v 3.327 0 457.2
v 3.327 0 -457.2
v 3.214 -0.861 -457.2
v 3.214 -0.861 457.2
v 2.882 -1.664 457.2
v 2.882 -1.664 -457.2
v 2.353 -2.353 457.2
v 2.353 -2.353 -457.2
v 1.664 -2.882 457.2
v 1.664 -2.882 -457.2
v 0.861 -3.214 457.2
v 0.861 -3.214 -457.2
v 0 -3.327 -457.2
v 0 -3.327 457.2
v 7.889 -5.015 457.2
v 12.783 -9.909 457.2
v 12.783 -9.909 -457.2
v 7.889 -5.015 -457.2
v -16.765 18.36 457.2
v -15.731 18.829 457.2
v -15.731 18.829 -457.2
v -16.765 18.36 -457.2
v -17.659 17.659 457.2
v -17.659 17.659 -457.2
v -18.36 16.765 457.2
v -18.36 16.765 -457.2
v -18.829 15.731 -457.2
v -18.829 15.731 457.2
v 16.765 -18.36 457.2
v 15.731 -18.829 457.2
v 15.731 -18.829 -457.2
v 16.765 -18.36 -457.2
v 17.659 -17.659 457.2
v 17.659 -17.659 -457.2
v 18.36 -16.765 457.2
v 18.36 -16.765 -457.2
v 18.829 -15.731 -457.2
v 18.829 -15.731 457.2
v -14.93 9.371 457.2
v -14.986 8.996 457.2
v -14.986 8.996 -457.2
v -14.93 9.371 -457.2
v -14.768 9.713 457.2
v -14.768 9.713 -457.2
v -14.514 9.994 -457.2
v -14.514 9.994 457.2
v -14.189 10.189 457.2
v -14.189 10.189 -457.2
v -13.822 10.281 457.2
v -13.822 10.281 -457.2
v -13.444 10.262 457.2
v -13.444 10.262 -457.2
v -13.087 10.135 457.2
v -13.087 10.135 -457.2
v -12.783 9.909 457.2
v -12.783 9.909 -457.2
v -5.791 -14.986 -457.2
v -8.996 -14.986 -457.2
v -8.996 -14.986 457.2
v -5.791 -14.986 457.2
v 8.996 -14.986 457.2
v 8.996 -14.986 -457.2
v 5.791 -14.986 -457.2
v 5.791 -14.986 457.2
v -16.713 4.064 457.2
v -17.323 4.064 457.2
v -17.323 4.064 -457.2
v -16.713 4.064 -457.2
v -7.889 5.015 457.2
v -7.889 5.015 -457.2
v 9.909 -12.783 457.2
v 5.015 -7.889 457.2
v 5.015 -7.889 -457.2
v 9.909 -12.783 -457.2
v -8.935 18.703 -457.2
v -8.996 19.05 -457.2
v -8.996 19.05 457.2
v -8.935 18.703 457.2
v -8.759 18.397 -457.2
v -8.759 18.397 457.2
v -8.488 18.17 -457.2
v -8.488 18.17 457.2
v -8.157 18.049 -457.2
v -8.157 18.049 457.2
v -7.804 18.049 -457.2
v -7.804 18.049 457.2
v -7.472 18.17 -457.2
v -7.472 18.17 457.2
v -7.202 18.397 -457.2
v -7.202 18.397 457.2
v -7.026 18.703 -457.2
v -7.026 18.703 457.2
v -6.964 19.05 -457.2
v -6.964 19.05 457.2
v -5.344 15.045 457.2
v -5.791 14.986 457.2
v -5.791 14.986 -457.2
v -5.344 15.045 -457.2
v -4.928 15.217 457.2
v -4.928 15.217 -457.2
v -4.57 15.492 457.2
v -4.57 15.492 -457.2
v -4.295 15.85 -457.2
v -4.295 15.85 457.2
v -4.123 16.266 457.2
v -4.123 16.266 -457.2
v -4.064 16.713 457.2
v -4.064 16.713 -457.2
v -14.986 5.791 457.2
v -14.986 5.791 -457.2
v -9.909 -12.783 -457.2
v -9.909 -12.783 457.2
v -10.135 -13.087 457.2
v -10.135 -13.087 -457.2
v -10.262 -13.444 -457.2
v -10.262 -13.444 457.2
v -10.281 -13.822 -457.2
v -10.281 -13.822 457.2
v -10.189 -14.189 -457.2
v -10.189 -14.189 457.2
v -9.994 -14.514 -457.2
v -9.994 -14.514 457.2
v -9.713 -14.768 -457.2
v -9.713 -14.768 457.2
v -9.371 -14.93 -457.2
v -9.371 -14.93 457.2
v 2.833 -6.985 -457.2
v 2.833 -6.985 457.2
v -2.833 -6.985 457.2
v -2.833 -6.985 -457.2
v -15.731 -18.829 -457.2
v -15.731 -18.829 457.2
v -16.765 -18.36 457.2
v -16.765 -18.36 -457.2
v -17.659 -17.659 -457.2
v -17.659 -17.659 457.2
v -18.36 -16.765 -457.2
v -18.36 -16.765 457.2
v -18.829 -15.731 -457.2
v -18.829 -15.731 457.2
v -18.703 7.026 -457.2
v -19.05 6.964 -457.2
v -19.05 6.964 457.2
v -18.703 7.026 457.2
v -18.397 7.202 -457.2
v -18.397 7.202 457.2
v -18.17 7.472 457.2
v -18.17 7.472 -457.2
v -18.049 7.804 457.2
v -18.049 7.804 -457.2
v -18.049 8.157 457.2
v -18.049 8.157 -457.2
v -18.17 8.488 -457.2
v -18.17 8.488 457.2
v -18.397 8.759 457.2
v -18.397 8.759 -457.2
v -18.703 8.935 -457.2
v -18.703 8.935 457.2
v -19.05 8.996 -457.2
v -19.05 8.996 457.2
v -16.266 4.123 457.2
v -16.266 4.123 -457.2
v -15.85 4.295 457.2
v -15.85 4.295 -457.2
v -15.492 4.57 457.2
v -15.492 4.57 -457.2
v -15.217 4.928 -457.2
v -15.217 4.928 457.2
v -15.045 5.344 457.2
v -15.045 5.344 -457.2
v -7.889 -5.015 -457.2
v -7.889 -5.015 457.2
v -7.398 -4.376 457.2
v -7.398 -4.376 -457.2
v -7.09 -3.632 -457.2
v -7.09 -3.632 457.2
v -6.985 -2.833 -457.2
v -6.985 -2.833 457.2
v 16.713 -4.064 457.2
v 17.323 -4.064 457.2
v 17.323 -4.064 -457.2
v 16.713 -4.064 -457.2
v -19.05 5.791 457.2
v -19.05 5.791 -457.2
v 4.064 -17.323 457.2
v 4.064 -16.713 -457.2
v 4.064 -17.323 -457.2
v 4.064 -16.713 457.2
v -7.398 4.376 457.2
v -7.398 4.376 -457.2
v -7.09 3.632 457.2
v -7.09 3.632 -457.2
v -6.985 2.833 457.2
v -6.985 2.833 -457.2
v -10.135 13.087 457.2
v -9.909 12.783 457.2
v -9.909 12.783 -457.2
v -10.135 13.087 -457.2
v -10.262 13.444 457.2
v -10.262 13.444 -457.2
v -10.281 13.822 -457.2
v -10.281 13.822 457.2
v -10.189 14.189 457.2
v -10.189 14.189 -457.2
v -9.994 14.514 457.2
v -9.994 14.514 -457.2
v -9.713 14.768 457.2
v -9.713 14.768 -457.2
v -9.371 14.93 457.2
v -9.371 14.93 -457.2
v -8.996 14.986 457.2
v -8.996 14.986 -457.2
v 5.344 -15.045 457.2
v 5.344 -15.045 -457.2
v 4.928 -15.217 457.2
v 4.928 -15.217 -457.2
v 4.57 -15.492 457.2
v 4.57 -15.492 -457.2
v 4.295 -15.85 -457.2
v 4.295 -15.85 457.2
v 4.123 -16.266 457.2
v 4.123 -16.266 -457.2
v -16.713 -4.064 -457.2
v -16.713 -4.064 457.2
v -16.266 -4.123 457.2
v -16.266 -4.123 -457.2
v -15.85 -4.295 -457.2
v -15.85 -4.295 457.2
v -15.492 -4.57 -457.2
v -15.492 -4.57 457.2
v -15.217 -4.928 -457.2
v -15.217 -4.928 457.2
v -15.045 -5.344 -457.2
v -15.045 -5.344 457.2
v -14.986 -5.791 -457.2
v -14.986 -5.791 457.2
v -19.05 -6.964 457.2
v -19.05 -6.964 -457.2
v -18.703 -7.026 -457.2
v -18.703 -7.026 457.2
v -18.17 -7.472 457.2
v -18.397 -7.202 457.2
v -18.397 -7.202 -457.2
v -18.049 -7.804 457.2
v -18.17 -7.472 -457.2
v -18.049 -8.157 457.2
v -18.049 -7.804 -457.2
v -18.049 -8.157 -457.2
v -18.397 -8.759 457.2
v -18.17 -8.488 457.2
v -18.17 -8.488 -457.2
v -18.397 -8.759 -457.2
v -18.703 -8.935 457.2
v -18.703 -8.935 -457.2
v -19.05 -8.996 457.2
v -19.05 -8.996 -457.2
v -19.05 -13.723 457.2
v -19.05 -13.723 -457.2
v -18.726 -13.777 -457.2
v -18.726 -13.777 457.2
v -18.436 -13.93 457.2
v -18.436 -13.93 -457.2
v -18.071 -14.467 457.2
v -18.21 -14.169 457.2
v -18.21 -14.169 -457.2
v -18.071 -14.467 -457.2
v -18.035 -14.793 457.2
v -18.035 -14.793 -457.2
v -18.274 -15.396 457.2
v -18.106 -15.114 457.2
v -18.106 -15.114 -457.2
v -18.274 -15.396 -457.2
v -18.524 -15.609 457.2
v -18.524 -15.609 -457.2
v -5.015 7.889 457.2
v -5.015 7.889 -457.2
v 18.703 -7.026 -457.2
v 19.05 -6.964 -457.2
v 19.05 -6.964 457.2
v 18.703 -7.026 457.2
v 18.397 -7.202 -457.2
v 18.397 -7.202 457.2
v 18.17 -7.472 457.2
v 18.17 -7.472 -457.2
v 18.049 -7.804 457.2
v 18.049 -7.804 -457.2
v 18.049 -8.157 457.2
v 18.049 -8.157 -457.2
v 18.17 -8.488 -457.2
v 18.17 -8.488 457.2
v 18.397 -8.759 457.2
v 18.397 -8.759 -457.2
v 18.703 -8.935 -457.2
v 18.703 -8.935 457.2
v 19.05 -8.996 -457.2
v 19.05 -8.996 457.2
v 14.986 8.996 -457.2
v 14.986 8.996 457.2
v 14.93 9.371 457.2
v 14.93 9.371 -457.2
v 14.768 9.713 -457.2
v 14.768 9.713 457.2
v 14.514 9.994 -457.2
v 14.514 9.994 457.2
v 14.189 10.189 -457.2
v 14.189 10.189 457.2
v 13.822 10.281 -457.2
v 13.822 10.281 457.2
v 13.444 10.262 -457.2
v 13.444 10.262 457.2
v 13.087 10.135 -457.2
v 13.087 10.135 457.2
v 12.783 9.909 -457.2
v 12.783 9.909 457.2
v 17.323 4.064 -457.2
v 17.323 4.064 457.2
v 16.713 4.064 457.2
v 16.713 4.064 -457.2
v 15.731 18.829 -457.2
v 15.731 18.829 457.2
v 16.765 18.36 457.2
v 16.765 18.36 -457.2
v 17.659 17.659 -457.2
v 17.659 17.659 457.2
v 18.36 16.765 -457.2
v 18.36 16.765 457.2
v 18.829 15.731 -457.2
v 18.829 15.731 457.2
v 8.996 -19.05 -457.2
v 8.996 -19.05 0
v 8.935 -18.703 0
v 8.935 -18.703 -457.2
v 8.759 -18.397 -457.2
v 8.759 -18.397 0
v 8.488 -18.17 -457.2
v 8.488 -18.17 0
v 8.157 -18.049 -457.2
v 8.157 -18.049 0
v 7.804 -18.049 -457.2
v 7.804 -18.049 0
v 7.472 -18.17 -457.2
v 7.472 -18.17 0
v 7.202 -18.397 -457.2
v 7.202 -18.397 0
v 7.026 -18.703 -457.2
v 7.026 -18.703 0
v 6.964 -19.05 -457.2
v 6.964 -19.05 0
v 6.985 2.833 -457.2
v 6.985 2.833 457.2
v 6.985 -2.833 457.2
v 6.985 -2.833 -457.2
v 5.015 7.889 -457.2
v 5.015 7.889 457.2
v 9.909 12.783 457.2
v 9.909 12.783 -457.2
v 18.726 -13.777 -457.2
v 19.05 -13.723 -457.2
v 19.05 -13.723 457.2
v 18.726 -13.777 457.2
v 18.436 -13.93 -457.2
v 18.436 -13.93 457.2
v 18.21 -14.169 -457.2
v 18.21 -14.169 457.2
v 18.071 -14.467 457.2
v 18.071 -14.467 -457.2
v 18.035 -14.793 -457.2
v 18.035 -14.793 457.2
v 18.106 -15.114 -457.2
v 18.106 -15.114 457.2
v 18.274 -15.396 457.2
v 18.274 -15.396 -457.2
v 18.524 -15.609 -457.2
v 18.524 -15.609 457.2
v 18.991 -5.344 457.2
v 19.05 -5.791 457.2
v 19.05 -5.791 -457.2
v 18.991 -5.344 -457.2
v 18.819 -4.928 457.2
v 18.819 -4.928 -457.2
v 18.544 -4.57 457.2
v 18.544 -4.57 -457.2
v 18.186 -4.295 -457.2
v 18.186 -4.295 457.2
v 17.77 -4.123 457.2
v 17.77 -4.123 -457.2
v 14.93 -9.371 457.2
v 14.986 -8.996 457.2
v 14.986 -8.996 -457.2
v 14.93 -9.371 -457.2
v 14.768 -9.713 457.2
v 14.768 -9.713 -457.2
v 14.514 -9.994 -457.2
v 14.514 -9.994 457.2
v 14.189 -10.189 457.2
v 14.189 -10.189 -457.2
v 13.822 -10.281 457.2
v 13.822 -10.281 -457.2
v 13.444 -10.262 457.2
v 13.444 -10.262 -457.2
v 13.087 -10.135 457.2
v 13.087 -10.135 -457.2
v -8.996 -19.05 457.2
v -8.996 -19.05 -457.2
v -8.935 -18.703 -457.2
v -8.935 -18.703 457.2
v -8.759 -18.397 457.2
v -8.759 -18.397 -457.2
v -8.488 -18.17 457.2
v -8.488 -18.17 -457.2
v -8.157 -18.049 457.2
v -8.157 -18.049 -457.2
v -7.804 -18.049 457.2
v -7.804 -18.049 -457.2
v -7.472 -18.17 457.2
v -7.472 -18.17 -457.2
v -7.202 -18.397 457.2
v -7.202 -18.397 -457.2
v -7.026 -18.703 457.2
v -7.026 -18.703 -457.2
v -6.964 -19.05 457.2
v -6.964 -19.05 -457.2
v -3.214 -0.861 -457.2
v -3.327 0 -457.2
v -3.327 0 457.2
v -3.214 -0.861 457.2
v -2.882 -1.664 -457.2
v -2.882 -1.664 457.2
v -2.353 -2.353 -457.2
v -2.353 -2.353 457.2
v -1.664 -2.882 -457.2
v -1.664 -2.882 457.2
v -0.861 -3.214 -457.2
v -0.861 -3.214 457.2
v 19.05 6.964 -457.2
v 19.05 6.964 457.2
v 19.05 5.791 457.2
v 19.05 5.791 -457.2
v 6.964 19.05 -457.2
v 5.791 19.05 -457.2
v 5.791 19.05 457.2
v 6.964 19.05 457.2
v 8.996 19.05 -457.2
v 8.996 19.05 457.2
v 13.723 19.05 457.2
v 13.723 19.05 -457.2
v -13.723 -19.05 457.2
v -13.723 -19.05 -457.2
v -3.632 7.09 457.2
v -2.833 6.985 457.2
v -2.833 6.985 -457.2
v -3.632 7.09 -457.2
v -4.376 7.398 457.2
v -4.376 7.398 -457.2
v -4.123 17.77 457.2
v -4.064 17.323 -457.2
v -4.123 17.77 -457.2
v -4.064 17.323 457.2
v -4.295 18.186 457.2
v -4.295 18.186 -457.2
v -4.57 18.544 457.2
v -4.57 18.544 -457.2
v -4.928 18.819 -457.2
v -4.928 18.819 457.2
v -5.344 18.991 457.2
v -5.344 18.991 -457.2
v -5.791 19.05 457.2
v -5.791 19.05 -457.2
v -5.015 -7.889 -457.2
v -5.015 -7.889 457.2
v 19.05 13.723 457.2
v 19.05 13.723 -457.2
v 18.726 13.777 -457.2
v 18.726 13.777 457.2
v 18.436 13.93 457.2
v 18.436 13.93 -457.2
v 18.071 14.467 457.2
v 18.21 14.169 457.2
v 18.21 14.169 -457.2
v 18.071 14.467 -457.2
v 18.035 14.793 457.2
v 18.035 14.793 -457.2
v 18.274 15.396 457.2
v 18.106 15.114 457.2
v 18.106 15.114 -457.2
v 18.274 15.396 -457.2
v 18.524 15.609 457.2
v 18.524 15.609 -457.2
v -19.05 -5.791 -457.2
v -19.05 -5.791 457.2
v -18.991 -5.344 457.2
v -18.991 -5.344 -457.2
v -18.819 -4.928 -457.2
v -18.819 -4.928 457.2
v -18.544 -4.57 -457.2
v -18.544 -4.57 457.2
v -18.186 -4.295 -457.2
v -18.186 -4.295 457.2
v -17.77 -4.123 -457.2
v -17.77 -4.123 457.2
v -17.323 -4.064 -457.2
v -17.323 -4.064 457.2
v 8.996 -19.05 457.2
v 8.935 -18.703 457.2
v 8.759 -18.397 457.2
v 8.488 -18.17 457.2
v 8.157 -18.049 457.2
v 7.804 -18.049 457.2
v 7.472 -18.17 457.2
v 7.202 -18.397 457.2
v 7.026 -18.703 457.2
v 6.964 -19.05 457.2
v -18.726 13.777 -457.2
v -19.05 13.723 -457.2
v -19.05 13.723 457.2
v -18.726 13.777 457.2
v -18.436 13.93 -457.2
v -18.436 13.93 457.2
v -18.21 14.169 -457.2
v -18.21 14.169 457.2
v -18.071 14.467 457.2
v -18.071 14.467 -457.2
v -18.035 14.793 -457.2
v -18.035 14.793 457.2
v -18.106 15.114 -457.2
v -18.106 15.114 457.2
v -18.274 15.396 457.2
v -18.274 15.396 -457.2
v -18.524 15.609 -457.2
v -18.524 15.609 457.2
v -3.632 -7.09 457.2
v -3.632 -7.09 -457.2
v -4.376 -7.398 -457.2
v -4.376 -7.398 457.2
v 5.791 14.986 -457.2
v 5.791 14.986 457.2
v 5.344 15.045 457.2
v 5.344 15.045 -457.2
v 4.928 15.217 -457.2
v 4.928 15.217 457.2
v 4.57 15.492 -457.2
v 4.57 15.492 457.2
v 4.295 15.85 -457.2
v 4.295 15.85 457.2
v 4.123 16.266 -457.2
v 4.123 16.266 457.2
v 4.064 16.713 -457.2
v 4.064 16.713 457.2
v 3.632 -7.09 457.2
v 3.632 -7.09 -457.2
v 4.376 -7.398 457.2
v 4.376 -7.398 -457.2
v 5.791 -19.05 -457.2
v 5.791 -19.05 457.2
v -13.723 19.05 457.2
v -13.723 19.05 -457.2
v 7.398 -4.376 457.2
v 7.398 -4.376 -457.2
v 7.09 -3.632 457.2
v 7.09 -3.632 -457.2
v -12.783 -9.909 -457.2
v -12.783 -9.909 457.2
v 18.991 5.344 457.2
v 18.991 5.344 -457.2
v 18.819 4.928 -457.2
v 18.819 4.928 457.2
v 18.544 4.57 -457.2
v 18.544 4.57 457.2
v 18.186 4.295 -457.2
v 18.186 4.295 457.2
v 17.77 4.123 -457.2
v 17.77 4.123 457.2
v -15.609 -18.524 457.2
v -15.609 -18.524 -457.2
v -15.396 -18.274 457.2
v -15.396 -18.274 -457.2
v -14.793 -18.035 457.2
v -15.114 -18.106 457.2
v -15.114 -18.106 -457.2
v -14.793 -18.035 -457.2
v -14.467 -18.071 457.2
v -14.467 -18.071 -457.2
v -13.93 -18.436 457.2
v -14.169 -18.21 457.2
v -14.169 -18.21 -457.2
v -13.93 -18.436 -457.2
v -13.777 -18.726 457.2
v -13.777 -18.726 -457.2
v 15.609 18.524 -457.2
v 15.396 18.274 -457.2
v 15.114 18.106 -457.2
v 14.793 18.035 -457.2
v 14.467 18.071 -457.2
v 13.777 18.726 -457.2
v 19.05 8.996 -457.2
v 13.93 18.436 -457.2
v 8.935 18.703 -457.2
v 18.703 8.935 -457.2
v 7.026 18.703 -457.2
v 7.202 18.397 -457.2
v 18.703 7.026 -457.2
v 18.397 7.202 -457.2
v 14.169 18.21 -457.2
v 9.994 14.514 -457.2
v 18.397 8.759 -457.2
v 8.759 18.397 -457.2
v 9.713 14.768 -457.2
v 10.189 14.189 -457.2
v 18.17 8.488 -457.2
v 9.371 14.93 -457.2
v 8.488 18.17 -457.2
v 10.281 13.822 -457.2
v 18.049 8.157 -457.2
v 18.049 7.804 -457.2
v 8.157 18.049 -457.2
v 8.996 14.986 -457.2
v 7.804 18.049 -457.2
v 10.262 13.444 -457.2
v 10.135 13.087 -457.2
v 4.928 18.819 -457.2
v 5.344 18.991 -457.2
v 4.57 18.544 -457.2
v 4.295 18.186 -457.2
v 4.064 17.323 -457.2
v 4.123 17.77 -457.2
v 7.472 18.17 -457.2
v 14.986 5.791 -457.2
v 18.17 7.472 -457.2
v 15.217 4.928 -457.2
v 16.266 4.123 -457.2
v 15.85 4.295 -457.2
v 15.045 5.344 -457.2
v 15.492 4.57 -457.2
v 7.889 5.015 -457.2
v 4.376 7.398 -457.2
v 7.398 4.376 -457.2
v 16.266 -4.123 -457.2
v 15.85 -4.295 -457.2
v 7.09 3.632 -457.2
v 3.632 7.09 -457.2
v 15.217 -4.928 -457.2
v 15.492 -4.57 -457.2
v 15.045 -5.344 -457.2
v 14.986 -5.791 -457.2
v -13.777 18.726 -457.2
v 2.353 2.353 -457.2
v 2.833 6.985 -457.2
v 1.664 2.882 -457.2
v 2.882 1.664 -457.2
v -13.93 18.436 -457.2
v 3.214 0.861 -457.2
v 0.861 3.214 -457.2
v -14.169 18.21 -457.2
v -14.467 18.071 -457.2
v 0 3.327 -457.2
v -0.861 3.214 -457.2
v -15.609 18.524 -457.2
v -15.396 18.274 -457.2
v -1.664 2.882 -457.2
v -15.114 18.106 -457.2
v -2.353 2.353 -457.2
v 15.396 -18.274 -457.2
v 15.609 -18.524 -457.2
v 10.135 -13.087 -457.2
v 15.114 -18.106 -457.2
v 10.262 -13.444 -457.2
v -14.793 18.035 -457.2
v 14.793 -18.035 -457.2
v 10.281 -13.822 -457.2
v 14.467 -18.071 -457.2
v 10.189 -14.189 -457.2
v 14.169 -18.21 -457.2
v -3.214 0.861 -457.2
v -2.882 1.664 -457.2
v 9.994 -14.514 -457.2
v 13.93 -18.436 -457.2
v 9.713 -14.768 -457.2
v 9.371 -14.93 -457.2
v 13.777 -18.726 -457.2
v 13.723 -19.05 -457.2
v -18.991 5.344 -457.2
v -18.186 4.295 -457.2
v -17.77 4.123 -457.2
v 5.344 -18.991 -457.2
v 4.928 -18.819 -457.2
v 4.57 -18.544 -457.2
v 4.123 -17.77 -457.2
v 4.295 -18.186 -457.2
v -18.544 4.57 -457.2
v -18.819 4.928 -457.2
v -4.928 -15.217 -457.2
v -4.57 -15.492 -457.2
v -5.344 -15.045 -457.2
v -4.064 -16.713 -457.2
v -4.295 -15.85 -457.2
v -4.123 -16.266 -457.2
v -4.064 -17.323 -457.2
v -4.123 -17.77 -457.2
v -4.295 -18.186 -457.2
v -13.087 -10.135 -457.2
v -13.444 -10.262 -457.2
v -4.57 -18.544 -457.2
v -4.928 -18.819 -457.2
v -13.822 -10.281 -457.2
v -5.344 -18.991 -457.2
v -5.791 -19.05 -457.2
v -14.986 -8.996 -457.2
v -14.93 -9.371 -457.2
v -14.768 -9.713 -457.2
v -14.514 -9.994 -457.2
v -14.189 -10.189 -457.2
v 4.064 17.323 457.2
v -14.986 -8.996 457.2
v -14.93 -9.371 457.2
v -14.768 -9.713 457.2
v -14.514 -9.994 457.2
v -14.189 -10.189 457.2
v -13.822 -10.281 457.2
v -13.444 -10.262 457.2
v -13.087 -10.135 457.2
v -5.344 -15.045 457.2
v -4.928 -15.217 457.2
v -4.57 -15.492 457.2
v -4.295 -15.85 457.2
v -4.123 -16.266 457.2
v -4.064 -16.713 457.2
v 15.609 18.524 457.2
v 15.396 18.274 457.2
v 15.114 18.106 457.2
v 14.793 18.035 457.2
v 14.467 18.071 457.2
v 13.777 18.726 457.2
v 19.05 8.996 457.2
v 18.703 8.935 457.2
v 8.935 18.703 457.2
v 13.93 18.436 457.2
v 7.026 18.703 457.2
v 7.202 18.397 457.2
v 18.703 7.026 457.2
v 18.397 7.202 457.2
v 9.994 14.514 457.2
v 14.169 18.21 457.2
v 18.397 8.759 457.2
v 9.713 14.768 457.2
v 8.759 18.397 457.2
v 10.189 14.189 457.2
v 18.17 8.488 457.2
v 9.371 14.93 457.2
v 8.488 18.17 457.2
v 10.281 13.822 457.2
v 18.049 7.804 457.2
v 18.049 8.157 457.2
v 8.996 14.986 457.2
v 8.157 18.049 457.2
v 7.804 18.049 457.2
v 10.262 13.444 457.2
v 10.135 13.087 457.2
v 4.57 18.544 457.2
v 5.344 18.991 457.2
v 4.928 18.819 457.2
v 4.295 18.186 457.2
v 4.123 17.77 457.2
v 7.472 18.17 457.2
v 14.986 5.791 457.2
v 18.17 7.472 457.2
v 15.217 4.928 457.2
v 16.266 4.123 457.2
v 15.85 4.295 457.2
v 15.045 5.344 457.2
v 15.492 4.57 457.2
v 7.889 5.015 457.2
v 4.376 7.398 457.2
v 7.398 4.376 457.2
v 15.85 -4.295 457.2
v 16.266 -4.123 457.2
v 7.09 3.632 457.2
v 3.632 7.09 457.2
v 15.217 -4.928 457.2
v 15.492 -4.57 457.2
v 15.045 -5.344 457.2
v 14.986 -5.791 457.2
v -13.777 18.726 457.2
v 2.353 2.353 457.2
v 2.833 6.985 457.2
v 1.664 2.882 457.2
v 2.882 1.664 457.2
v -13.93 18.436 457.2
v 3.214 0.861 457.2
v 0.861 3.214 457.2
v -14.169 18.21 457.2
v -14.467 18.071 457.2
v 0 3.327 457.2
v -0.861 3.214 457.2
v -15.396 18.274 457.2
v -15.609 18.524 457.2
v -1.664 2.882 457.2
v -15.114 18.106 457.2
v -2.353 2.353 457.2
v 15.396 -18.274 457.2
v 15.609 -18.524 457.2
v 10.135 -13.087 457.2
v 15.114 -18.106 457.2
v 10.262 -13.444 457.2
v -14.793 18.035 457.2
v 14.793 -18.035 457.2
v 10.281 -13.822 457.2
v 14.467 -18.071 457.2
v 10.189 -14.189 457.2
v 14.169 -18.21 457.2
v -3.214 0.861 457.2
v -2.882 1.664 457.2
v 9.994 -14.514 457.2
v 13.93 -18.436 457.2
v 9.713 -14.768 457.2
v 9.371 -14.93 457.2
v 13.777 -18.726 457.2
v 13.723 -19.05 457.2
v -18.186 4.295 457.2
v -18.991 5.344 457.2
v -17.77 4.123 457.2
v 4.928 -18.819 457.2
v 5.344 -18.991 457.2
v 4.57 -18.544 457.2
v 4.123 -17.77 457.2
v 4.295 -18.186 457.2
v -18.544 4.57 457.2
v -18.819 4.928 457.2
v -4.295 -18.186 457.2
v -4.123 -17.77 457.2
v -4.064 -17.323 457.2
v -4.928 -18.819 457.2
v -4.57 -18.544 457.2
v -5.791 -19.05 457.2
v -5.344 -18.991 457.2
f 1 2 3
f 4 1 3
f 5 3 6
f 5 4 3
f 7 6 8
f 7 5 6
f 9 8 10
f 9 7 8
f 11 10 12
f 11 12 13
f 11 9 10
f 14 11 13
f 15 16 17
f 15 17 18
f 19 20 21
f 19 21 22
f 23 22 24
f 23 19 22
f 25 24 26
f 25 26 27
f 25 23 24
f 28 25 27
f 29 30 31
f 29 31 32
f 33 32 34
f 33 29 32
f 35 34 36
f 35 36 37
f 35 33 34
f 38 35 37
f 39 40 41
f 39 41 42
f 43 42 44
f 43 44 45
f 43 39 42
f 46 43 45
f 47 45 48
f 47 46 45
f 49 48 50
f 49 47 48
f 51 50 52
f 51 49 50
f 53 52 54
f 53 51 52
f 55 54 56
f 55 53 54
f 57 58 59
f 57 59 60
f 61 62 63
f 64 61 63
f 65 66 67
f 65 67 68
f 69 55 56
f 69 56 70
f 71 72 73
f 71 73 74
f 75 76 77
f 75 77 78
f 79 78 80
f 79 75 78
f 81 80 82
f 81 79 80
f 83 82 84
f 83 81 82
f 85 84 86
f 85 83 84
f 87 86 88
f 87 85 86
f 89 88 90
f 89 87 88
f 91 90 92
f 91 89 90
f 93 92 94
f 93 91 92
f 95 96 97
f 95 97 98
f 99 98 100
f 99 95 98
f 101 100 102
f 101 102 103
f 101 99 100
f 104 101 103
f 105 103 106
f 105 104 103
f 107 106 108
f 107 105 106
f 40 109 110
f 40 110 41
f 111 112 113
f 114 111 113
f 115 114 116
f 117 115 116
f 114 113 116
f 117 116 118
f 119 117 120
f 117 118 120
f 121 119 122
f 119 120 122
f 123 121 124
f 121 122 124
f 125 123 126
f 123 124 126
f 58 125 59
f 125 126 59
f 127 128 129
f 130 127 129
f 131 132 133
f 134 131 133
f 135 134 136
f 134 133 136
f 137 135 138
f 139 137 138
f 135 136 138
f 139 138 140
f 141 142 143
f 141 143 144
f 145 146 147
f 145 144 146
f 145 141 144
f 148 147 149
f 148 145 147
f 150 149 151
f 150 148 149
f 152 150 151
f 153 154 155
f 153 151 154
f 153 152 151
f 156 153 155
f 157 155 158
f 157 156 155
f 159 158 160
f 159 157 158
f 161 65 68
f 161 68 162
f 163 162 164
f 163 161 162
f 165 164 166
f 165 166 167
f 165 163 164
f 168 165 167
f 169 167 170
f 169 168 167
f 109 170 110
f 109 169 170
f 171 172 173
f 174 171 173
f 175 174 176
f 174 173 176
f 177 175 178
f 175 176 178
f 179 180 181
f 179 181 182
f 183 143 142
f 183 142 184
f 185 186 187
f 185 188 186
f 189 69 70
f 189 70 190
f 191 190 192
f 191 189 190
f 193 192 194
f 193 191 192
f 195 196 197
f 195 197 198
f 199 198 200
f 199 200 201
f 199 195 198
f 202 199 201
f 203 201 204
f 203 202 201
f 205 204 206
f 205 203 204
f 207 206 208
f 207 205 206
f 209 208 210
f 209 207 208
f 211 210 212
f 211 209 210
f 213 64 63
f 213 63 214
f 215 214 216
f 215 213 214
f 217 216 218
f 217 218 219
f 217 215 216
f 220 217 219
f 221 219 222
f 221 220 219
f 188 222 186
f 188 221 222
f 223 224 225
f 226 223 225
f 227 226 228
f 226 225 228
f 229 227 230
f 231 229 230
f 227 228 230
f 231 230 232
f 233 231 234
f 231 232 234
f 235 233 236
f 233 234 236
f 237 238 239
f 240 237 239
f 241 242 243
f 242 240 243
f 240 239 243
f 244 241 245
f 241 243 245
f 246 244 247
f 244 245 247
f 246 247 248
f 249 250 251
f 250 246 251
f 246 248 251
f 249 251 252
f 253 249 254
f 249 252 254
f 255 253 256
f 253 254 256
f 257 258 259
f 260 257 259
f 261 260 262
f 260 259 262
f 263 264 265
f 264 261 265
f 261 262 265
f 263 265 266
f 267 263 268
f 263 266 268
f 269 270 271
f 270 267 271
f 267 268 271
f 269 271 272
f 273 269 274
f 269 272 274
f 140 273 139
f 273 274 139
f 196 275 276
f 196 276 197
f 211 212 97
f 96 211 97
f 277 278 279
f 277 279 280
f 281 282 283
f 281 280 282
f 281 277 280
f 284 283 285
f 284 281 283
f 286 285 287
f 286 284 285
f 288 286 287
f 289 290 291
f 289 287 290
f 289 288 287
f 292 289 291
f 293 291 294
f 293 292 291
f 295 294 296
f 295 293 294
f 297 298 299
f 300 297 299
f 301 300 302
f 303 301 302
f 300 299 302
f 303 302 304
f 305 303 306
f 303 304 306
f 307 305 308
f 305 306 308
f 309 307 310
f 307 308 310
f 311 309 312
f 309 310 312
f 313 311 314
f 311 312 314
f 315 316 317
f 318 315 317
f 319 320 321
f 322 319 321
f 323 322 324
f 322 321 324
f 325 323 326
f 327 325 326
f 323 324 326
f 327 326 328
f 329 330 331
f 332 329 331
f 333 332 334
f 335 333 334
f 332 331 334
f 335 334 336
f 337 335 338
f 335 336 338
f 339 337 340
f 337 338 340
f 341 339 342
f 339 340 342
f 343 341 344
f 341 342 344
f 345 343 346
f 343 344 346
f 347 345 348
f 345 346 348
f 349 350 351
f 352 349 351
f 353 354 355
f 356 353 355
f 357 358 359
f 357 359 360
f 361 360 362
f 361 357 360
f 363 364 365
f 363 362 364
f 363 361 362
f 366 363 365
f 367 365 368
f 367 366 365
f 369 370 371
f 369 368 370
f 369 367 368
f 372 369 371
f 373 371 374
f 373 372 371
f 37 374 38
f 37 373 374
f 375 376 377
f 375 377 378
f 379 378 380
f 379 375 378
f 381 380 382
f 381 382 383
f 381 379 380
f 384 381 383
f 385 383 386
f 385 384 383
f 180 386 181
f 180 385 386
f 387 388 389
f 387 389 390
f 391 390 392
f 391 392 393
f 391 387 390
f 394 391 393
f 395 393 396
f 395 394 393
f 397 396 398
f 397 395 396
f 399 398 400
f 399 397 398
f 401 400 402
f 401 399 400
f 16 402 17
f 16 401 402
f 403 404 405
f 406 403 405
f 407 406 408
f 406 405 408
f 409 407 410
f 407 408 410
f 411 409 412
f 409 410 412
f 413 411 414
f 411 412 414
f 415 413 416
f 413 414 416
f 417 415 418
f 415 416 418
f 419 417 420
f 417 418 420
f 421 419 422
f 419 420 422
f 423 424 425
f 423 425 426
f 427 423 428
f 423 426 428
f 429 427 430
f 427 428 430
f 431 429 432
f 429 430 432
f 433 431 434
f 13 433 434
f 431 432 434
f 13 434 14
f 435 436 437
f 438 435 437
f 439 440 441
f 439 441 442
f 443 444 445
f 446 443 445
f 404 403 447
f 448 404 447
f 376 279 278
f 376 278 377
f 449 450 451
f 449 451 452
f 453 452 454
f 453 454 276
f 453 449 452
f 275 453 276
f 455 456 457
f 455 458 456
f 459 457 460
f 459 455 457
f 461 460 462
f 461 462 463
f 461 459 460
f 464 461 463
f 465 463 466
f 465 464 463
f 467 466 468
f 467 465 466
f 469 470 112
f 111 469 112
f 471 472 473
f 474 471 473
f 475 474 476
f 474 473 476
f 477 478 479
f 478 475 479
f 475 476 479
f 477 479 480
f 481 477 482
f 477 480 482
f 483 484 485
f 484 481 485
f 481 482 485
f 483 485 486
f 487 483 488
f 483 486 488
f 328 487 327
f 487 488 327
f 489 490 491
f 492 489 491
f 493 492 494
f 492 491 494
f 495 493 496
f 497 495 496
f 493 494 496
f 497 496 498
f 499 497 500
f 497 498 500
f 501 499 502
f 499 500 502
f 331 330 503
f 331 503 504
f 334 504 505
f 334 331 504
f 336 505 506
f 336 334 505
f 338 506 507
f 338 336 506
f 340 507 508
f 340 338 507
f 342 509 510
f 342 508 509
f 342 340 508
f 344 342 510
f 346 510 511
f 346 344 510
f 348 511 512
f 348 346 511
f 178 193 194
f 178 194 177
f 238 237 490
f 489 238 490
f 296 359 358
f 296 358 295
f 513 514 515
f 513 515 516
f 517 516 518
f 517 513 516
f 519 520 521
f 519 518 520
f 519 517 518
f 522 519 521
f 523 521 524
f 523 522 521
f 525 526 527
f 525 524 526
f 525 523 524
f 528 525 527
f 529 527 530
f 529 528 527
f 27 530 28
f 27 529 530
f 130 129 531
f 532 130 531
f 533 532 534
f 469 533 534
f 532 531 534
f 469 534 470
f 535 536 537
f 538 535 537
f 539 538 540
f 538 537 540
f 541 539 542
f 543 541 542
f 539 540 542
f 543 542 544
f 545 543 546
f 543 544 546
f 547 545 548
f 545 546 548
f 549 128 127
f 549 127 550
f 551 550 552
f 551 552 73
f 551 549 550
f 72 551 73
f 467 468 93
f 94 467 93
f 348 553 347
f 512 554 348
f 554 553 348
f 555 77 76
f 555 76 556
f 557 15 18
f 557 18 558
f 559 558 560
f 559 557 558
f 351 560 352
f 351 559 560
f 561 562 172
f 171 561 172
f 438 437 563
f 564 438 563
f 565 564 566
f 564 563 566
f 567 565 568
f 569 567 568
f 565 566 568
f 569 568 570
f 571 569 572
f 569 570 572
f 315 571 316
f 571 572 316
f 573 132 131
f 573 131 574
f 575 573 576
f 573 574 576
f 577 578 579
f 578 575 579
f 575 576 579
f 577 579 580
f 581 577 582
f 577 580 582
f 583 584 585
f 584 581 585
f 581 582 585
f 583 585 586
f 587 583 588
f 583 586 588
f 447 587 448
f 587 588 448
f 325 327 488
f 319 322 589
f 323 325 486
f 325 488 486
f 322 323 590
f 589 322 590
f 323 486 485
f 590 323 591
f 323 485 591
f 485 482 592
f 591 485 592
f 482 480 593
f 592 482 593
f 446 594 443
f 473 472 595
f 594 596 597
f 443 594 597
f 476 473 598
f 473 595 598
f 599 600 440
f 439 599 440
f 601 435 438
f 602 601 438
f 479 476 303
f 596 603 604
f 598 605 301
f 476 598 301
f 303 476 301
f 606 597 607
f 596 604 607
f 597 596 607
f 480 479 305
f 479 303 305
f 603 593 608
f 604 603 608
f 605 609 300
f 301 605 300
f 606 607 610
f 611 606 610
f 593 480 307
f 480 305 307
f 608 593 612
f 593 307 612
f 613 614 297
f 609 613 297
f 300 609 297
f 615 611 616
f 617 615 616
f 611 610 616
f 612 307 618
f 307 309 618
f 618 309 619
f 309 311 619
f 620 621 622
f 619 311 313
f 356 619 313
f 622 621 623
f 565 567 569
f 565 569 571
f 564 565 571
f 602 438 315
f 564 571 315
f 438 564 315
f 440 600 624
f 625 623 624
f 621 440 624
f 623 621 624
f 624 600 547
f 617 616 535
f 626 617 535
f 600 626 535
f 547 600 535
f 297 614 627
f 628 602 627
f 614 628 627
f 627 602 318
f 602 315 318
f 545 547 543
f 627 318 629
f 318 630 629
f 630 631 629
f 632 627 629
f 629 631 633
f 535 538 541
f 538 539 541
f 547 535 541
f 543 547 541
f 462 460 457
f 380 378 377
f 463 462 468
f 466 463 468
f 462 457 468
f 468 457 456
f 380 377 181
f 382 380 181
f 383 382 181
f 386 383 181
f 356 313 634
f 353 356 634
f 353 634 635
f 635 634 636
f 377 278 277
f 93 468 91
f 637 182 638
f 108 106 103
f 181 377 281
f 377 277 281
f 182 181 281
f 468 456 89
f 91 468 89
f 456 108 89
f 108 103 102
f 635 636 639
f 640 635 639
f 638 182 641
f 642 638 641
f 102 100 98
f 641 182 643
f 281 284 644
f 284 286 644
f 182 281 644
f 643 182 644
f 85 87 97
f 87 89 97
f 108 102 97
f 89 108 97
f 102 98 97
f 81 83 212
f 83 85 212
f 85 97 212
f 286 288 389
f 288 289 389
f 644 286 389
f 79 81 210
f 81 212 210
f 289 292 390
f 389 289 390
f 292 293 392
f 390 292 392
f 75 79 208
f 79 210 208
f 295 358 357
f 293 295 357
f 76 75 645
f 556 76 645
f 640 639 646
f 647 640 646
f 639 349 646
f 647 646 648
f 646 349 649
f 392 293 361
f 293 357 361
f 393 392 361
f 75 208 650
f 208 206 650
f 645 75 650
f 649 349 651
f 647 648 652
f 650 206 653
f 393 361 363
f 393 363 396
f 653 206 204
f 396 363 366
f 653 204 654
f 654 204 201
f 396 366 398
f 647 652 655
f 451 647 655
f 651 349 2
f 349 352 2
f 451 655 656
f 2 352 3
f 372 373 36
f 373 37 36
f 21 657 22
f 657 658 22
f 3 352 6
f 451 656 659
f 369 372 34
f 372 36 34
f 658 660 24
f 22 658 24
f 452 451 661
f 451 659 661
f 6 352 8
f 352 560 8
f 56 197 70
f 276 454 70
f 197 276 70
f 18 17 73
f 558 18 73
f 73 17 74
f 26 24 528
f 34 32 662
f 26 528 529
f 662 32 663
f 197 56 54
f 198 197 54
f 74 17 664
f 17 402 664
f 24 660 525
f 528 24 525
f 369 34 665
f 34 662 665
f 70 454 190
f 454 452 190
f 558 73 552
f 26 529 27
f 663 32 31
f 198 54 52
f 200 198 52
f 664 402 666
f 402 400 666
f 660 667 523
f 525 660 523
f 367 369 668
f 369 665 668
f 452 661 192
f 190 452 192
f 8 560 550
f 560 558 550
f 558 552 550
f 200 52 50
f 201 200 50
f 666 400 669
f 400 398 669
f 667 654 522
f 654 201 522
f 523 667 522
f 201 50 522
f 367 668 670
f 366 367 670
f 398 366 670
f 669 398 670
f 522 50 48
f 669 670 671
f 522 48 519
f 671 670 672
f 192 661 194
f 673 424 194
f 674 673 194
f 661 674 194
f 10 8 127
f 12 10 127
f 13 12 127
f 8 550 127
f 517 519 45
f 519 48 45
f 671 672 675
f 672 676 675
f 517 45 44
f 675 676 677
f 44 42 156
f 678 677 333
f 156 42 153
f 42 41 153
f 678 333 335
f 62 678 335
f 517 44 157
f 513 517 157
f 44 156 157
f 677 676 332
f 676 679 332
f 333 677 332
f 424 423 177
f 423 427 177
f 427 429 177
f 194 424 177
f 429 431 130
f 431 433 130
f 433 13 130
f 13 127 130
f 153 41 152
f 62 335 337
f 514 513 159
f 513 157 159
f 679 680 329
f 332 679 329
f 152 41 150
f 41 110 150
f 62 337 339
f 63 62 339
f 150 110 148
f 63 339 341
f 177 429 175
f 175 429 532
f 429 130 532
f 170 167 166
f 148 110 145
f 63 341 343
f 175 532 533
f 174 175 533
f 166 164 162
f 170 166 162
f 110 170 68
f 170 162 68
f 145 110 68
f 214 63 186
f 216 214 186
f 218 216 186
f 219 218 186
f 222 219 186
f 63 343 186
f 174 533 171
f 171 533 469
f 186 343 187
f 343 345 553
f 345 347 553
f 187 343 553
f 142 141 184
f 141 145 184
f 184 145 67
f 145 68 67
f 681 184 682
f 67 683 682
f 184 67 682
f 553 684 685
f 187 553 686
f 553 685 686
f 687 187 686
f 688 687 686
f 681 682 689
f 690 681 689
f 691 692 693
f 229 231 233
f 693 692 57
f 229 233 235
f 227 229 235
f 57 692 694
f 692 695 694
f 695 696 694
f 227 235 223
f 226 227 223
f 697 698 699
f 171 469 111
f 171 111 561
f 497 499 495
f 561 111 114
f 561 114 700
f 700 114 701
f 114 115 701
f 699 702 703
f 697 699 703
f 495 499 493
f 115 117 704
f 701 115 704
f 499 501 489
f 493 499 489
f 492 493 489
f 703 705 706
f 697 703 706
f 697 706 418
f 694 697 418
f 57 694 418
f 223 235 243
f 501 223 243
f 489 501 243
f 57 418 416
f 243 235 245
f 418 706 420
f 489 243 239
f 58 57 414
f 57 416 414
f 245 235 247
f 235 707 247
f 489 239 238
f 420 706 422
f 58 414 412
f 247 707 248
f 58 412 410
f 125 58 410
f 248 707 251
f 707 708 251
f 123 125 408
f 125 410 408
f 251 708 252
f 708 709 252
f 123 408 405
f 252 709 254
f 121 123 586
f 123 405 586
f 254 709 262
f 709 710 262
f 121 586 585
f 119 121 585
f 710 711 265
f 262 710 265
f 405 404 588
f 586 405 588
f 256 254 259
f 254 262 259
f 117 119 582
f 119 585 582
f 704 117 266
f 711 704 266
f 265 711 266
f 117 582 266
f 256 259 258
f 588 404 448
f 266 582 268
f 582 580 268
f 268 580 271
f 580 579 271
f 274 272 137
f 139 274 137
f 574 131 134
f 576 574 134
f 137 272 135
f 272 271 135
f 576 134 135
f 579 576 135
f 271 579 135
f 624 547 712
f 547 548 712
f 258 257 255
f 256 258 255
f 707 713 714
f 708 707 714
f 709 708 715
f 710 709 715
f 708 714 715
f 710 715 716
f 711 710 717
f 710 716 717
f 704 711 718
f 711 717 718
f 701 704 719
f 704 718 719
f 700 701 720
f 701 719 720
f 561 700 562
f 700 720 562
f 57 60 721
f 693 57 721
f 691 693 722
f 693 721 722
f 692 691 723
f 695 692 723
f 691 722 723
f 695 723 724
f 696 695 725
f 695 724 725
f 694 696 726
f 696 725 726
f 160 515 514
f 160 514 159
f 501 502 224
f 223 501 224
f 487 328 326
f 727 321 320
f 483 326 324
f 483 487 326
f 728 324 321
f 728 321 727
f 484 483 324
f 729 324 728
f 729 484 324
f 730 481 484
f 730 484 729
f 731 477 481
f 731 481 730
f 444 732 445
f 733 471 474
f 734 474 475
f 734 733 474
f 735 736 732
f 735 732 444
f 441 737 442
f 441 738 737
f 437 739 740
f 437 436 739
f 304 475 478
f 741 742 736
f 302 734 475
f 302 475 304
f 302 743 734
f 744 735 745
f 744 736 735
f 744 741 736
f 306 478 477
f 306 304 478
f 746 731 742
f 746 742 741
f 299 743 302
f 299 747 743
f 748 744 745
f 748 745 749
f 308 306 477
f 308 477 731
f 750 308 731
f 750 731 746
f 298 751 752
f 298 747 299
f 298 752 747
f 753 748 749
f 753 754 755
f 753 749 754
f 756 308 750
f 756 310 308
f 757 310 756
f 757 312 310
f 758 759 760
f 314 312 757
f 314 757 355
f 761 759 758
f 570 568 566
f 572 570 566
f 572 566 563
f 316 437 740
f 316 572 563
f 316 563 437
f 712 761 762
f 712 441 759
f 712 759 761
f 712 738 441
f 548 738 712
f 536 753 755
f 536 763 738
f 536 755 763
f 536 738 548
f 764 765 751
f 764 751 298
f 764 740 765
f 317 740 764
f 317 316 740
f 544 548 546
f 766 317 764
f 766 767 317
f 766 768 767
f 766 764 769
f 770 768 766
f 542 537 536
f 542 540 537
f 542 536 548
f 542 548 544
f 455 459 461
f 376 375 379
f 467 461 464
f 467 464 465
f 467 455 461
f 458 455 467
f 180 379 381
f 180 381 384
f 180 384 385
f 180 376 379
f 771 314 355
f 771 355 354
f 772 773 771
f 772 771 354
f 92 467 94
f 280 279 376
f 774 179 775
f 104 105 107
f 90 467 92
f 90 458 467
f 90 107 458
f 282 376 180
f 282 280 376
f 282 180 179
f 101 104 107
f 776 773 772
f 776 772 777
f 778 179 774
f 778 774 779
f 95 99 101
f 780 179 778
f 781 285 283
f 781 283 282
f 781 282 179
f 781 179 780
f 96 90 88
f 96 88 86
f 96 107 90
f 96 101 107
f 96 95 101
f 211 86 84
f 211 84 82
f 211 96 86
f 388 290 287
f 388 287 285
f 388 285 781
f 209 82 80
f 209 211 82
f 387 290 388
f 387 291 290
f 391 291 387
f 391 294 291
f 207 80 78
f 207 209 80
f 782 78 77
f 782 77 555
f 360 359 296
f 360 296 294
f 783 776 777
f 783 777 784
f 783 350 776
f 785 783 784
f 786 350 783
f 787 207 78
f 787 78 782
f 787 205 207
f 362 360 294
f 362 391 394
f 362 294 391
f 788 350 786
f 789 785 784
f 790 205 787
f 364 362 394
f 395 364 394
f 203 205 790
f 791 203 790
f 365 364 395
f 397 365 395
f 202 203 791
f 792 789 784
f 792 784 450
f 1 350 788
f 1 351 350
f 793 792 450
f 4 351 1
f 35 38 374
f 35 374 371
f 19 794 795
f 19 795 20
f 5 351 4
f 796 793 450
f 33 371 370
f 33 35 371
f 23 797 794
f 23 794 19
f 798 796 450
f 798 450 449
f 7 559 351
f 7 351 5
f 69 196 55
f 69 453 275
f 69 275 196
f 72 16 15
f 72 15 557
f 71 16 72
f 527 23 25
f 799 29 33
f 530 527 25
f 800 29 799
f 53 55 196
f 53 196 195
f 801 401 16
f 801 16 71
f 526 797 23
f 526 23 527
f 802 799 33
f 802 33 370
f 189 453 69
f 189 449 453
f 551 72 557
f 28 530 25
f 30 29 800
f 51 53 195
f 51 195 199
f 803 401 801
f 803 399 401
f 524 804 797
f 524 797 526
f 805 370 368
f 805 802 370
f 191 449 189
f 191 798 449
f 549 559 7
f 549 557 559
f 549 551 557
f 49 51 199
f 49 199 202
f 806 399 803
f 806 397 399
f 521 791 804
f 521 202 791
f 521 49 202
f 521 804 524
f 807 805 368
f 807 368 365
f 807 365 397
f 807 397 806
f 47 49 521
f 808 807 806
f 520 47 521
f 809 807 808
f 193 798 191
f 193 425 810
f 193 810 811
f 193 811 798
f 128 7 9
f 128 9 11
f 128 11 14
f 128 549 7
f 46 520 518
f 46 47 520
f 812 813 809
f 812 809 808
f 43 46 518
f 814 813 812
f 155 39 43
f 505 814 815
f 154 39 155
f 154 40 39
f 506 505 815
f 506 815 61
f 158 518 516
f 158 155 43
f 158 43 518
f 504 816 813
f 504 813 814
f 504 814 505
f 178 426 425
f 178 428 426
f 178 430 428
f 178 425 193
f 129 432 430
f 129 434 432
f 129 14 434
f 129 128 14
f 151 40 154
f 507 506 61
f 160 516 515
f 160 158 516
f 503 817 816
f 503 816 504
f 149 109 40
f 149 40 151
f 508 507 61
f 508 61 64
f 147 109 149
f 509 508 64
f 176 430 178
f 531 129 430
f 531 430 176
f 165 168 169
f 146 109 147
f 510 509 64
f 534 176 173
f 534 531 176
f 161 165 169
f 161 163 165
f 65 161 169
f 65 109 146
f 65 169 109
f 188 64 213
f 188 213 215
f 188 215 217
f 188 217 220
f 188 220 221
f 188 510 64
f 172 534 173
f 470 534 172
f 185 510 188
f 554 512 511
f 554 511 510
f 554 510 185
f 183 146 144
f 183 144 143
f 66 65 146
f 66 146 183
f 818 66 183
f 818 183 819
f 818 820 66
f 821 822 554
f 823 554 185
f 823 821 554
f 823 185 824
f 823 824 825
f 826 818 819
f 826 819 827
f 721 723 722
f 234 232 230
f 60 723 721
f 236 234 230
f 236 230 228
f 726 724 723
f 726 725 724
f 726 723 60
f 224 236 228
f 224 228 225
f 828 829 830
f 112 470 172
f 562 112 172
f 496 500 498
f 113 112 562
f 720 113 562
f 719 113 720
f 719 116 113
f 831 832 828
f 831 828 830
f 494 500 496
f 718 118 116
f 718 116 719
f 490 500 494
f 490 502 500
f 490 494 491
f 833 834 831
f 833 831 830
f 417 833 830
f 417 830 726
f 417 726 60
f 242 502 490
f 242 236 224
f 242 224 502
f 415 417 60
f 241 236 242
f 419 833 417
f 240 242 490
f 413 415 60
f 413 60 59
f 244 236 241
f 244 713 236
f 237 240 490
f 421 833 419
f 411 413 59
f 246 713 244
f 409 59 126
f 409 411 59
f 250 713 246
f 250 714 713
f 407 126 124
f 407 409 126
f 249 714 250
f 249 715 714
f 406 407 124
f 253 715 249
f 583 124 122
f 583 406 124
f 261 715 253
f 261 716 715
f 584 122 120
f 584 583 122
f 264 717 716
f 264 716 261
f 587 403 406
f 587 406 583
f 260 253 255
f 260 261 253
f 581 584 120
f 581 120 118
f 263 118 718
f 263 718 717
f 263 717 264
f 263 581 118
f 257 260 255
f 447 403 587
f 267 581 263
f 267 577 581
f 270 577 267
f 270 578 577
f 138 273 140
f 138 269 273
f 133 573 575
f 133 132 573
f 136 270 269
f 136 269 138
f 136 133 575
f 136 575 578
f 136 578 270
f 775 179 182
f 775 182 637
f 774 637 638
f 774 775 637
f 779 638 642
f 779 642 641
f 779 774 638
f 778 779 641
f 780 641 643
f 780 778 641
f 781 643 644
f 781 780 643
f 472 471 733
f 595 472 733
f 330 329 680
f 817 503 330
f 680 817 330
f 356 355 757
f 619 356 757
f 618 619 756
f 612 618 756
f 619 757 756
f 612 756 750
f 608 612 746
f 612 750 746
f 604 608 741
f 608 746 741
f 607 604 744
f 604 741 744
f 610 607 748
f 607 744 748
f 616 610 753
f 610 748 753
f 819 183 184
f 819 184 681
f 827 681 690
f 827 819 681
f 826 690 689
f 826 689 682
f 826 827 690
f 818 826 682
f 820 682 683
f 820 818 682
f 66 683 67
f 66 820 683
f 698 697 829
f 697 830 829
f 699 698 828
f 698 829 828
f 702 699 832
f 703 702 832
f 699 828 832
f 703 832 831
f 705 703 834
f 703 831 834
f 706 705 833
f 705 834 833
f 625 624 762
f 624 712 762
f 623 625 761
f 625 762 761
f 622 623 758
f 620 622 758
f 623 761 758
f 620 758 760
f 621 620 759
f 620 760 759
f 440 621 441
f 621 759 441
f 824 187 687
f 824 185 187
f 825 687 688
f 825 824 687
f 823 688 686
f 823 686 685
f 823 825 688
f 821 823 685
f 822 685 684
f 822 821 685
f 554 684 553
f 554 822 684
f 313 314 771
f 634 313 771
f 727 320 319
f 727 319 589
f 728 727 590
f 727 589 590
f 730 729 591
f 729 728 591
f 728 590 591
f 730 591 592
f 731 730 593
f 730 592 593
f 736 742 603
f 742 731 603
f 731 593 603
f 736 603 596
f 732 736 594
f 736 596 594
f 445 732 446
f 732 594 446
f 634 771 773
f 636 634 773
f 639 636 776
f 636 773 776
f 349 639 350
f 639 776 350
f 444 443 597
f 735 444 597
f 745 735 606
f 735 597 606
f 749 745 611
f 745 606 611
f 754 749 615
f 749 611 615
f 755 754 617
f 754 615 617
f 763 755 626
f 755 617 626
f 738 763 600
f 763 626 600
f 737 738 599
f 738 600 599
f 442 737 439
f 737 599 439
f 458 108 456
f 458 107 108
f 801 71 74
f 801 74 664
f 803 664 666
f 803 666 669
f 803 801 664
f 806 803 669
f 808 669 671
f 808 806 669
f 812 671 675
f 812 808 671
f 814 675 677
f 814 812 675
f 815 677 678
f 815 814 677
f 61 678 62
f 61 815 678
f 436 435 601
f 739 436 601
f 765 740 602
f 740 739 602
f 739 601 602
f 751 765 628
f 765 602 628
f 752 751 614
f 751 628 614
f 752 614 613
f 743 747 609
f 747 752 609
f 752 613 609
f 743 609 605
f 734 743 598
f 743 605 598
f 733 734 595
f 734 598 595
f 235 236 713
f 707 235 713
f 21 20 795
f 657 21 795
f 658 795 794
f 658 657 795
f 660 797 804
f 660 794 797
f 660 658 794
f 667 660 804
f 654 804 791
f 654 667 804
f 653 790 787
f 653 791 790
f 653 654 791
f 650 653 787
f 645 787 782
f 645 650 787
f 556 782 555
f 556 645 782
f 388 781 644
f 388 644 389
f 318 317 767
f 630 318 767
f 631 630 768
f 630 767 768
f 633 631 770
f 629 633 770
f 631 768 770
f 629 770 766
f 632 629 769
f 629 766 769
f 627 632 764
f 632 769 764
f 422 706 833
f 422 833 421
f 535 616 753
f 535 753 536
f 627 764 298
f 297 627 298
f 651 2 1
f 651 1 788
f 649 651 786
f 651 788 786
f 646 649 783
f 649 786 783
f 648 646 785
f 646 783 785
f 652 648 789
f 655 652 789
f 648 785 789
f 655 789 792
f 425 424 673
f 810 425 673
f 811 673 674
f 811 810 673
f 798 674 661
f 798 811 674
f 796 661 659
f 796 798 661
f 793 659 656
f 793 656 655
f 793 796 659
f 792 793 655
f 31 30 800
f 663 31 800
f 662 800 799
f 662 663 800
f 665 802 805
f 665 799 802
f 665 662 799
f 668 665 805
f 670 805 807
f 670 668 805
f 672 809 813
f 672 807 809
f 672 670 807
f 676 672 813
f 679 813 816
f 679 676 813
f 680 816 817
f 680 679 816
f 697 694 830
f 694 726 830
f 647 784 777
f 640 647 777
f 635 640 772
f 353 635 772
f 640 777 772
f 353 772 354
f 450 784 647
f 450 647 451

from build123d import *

# Parameters (mm, degrees)
BOSS_EXTRUDE1_DEPTH     = 457.2
SKETCH5_R               = 1.016
CUT_EXTRUDE1_DEPTH      = 458.2
CUT_EXTRUDE1_DEPTH_BACK = 458.2


with BuildPart() as part:
    # Sketch4 → Boss-Extrude1 (new body, symmetric)
    with BuildSketch(Plane.XY):
        with BuildLine():
            Line((5.7912, -19.05), (14.3002, -19.05))
            ThreePointArc((14.3002, -19.05), (17.658815789, -17.658815789), (19.05, -14.3002))
            Line((19.05, -14.3002), (19.05, -5.7912))
            ThreePointArc((19.05, -5.7912), (18.544114832, -4.569885168), (17.3228, -4.064))
            Line((17.3228, -4.064), (16.7132, -4.064))
            ThreePointArc((16.7132, -4.064), (15.491885168, -4.569885168), (14.986, -5.7912))
            Line((14.986, -5.7912), (14.986, -8.996305235))
            ThreePointArc((14.986, -8.996305235), (14.189232738, -10.188751711), (12.782646215, -9.908964256))
            Line((12.782646215, -9.908964256), (7.888897763, -5.015215804))
            ThreePointArc((7.888897763, -5.015215804), (7.219915375, -4.014012907), (6.985, -2.833013566))
            Line((6.985, -2.833013566), (6.985, 0))
            Line((6.985, 0), (3.3274, 0))
            ThreePointArc((3.3274, 0), (2.352827104, -2.352827104), (0, -3.3274))
            Line((0, -3.3274), (0, -6.985))
            Line((0, -6.985), (2.833013566, -6.985))
            ThreePointArc((2.833013566, -6.985), (4.014012907, -7.219915375), (5.015215804, -7.888897763))
            Line((5.015215804, -7.888897763), (9.908964256, -12.782646215))
            ThreePointArc((9.908964256, -12.782646215), (10.188751711, -14.189232738), (8.996305235, -14.986))
            Line((8.996305235, -14.986), (5.7912, -14.986))
            ThreePointArc((5.7912, -14.986), (4.569885168, -15.491885168), (4.064, -16.7132))
            Line((4.064, -16.7132), (4.064, -17.3228))
            ThreePointArc((4.064, -17.3228), (4.569885168, -18.544114832), (5.7912, -19.05))
        make_face()
    extrude(amount=BOSS_EXTRUDE1_DEPTH, both=True)

    # Sketch5 → Cut-Extrude1 (cut, two sides)
    with BuildSketch(Plane.XY) as cut_extrude1_sk:
        with Locations((14.739477062, -19.05)):
            Circle(SKETCH5_R)
        with Locations((7.980305235, -19.05)):
            Circle(SKETCH5_R)
        with Locations((19.05, -14.739477062)):
            Circle(SKETCH5_R)
        with Locations((19.05, -7.980305235)):
            Circle(SKETCH5_R)
    extrude(amount=CUT_EXTRUDE1_DEPTH, mode=Mode.SUBTRACT)
    extrude(cut_extrude1_sk.sketch, amount=-CUT_EXTRUDE1_DEPTH_BACK, mode=Mode.SUBTRACT)

    # Mirror1: part across plane


with BuildPart() as part_1:
    add(part.part)
    add(part.part.mirror(Plane(origin=(0, 0, 0), x_dir=(0, 0, 1), z_dir=(1, 0, 0))))

    # Mirror2: part across plane


with BuildPart() as part_2:
    add(part_1.part)
    add(part_1.part.mirror(Plane.ZX))


solid = part_2.part
